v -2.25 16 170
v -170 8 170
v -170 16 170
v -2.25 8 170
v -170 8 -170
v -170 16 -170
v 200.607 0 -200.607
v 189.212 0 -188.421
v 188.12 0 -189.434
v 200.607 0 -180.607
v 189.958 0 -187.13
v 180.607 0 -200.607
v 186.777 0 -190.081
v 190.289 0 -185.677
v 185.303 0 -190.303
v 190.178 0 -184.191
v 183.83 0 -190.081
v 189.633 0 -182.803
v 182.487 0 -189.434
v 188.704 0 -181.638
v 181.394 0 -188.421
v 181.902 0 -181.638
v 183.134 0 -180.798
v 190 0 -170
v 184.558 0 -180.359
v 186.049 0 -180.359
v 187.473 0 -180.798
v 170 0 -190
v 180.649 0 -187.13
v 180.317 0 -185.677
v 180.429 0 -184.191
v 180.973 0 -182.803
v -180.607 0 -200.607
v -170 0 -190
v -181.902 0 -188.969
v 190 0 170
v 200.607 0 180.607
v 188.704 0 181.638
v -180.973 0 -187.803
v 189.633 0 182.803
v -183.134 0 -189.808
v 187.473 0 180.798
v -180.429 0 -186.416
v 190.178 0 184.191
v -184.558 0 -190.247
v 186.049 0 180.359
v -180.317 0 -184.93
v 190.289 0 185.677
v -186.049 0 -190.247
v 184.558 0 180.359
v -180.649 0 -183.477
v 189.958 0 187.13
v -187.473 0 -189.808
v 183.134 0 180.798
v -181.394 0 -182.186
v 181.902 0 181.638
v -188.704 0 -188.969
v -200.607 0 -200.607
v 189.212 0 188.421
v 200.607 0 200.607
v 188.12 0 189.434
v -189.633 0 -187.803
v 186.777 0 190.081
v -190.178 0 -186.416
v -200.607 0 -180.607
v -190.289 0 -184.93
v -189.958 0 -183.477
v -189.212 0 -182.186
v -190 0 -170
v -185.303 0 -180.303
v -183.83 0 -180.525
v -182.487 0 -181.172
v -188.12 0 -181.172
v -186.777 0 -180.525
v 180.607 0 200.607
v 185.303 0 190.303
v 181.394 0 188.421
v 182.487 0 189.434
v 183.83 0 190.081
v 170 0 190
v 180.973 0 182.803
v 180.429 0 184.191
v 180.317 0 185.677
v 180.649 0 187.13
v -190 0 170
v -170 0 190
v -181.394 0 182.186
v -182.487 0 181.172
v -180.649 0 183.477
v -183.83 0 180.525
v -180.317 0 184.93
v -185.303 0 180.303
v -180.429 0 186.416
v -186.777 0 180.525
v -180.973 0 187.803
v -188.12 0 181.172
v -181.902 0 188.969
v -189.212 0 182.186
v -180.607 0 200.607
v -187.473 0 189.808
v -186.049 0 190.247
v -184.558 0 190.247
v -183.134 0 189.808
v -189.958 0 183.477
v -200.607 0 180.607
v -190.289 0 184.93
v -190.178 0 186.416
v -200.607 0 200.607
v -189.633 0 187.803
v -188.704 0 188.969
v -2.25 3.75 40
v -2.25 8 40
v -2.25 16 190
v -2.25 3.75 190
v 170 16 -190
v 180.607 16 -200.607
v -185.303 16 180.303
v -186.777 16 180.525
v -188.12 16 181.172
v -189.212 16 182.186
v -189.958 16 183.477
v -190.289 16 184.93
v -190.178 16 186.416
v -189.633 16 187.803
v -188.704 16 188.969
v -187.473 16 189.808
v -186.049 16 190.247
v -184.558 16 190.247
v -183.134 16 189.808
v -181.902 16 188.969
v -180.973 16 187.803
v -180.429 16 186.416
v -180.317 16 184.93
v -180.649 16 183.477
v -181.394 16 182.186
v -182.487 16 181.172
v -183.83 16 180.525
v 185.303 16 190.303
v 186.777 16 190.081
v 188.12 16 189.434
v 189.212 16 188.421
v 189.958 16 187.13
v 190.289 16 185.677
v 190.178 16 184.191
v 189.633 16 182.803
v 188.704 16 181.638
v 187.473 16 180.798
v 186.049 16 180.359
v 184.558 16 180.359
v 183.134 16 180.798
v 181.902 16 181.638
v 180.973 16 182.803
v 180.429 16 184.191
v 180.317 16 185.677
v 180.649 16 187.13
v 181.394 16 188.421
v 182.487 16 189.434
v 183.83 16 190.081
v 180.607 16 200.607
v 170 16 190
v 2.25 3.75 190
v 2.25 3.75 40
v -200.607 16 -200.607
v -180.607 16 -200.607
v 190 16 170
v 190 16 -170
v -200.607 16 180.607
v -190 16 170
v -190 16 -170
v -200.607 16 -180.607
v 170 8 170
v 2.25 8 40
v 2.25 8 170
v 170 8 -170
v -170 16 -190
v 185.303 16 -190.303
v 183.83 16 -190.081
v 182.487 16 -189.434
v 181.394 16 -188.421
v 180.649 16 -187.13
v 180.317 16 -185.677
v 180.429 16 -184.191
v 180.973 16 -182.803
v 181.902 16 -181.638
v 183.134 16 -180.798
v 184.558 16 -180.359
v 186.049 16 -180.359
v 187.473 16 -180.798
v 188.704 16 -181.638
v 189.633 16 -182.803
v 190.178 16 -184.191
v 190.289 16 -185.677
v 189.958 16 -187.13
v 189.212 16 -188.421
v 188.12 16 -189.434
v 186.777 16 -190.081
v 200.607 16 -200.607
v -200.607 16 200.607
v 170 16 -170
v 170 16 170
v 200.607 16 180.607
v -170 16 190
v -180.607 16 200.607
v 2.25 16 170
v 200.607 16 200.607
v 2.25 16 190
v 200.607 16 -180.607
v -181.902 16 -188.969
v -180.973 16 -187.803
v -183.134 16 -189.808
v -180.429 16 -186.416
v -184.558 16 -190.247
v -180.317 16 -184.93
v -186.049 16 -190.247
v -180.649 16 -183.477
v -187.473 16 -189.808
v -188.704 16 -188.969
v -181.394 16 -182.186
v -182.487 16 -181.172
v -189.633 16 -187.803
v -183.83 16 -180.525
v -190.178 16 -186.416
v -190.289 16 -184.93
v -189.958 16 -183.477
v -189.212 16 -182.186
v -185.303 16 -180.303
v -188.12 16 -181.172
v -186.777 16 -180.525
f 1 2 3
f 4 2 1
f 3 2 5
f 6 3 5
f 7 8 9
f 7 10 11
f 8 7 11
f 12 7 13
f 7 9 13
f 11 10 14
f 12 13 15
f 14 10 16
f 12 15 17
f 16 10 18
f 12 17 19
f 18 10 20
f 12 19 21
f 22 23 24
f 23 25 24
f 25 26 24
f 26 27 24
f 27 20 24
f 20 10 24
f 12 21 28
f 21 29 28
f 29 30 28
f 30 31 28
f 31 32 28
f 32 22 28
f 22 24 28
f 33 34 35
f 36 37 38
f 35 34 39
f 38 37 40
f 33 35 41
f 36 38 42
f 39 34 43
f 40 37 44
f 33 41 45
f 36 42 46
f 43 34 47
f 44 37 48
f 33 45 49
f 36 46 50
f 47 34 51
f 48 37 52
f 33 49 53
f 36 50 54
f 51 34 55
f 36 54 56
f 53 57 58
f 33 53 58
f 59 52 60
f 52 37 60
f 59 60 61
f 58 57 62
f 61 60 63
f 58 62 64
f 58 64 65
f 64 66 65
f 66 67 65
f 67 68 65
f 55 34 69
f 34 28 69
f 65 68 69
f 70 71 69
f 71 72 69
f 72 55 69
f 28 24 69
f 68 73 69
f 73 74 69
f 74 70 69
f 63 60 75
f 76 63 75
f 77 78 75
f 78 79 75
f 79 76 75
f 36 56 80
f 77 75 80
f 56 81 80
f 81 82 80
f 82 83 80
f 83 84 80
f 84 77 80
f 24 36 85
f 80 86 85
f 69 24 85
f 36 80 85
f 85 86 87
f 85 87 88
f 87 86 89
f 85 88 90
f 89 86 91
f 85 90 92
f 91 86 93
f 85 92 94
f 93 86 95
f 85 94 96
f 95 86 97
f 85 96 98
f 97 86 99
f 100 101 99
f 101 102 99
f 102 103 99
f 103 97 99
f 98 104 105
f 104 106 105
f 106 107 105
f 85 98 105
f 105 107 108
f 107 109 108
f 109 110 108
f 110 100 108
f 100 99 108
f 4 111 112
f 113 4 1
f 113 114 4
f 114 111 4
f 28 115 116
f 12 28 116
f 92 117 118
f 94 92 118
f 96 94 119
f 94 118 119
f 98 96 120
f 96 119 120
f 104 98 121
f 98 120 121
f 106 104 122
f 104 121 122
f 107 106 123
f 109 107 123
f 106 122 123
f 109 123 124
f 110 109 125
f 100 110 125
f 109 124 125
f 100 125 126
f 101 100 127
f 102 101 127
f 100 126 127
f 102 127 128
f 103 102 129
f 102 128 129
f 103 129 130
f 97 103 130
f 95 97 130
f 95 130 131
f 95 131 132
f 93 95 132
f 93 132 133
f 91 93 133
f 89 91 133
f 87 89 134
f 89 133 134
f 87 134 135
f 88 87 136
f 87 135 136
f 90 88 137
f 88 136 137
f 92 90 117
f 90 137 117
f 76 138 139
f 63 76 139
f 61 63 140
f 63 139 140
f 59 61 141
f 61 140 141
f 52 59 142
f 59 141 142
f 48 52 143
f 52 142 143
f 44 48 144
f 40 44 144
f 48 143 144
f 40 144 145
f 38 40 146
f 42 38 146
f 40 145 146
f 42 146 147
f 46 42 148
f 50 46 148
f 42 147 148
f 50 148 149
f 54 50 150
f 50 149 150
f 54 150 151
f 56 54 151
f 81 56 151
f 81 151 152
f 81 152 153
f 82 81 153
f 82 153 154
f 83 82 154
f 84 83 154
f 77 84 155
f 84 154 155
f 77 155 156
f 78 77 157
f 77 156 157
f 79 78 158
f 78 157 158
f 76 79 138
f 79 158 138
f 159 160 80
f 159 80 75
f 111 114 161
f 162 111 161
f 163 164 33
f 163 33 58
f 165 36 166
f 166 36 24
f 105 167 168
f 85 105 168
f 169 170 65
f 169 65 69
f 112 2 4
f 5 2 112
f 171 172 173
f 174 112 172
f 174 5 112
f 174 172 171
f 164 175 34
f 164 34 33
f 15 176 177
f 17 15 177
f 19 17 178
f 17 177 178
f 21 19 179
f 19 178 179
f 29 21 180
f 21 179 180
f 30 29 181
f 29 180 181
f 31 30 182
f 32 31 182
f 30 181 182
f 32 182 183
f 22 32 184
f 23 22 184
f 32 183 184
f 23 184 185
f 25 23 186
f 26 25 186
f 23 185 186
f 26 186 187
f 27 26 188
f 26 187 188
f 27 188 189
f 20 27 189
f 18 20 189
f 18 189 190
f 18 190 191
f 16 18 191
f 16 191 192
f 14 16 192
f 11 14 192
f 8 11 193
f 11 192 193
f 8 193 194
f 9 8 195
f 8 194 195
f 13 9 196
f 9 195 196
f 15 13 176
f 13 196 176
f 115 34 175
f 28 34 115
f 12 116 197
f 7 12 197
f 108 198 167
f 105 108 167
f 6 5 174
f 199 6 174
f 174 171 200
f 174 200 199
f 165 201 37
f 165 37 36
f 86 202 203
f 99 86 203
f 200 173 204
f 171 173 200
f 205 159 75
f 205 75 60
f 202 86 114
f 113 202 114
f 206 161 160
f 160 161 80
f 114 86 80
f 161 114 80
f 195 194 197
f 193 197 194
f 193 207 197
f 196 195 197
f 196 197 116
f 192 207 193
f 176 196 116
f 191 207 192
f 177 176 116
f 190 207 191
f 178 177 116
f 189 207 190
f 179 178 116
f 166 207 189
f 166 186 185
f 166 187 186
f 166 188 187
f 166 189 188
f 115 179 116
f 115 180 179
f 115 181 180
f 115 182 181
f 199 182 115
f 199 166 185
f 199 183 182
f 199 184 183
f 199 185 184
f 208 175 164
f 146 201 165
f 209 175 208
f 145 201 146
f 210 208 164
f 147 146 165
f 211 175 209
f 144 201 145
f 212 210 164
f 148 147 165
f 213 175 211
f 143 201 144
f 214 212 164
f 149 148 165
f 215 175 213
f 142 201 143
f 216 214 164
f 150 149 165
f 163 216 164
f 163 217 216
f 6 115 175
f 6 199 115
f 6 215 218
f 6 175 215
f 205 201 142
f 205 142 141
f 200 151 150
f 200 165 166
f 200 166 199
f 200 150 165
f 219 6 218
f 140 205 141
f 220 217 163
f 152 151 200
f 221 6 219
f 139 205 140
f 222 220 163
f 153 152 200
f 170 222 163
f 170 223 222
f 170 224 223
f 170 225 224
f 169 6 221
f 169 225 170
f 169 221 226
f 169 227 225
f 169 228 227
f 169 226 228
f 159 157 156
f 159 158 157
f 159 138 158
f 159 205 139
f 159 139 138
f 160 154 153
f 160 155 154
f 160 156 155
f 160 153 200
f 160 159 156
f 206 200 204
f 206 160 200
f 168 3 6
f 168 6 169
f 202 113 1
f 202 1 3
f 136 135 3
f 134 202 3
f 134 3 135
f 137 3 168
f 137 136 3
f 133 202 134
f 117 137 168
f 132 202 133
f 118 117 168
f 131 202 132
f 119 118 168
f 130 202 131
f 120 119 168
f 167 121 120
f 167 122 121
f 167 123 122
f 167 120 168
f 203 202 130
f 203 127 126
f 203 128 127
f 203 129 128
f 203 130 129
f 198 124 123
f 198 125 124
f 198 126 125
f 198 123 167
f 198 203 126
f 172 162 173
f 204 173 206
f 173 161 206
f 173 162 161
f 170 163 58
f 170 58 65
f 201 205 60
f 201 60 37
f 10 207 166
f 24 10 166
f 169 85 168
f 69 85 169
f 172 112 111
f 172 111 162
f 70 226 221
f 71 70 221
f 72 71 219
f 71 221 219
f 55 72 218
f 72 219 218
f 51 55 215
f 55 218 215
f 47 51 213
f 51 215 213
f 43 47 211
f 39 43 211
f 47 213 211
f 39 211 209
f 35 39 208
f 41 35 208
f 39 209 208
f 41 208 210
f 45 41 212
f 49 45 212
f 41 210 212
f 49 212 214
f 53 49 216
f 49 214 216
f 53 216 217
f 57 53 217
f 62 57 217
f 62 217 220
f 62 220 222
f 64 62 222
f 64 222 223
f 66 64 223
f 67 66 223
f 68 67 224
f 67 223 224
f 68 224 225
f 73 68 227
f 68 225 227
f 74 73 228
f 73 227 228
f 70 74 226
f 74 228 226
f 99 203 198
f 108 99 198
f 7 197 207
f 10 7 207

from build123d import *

# Parameters (mm, degrees)
SKETCH1_W            = 380
SKETCH1_H            = 380
BOSS_EXTRUDE1_DEPTH  = 8
SKETCH2_W            = 380
SKETCH2_H            = 380
SKETCH2_W_2          = 340
SKETCH2_H_2          = 340
BOSS_EXTRUDE2_DEPTH  = 8
BOSS_EXTRUDE3_DEPTH  = 16
MIRROR2_COPY_1_DEPTH = 16
SKETCH6_R            = 5
CUT_EXTRUDE1_DEPTH   = 16
SKETCH8_W            = 4.5
SKETCH8_H            = 30
CUT_EXTRUDE2_DEPTH   = 150


with BuildPart() as part:
    # Sketch1 → Boss-Extrude1 (new body)
    with BuildSketch(Plane(origin=(0, 0, 0), x_dir=(1, 0, 0), z_dir=(0, 1, 0))):
        Rectangle(SKETCH1_W, SKETCH1_H)
    extrude(amount=BOSS_EXTRUDE1_DEPTH)

    # Sketch2 → Boss-Extrude2 (add)
    with BuildSketch(Plane(origin=(0, 8, 0), x_dir=(1, 0, 0), z_dir=(0, 1, 0))):
        Rectangle(SKETCH2_W, SKETCH2_H)
        Rectangle(SKETCH2_W_2, SKETCH2_H_2, mode=Mode.SUBTRACT)
    extrude(amount=BOSS_EXTRUDE2_DEPTH)

    # Sketch3 → Boss-Extrude3 (add)
    with BuildSketch(Plane(origin=(0, 16, 0), x_dir=(1, 0, 0), z_dir=(0, 1, 0))):
        Polygon((-200.606601718, 180.606601718), (-190, 170), (-190, 190), (-170, 190), (-180.606601718, 200.606601718), (-200.606601718, 200.606601718), align=None)
    boss_extrude3 = extrude(amount=-BOSS_EXTRUDE3_DEPTH)

    # Mirror1: Boss-Extrude3 across plane
    add(boss_extrude3.mirror(Plane(origin=(0, 0, 0), x_dir=(0, 0, 1), z_dir=(1, 0, 0))))

    # Mirror2: Boss-Extrude3 across plane
    add(boss_extrude3.mirror(Plane.XY))

    # Mirror2 copy 1 sketch → Mirror2 copy 1 (add)
    with BuildSketch(Plane(origin=(0, 16, 0), x_dir=(-1, 0, 0), z_dir=(0, 1, 0))):
        Polygon((-200.606601718, 180.606601718), (-190, 170), (-190, 190), (-170, 190), (-180.606601718, 200.606601718), (-200.606601718, 200.606601718), align=None)
    extrude(amount=-MIRROR2_COPY_1_DEPTH)

    # Sketch6 → Cut-Extrude1 (cut)
    with BuildSketch(Plane(origin=(0, 16, 0), x_dir=(1, 0, 0), z_dir=(0, 1, 0))):
        with Locations(Location((-185.303300859, 185.303300859, 0), (0, 0, 270))):
            Circle(SKETCH6_R)
        with Locations(Location((185.303300859, 185.303300859, 0), (0, 0, 90))):
            Circle(SKETCH6_R)
        with Locations(Location((185.303300859, -185.303300859, 0), (0, 0, 270))):
            Circle(SKETCH6_R)
        with Locations(Location((-185.303300859, -185.303300859, 0), (0, 0, 90))):
            Circle(SKETCH6_R)
    extrude(amount=-CUT_EXTRUDE1_DEPTH, mode=Mode.SUBTRACT)

    # Sketch8 → Cut-Extrude2 (cut)
    with BuildSketch(Plane.XY.offset(190)):
        with Locations((0, 18.75)):
            Rectangle(SKETCH8_W, SKETCH8_H)
    extrude(amount=-CUT_EXTRUDE2_DEPTH, mode=Mode.SUBTRACT)


solid = part.part
